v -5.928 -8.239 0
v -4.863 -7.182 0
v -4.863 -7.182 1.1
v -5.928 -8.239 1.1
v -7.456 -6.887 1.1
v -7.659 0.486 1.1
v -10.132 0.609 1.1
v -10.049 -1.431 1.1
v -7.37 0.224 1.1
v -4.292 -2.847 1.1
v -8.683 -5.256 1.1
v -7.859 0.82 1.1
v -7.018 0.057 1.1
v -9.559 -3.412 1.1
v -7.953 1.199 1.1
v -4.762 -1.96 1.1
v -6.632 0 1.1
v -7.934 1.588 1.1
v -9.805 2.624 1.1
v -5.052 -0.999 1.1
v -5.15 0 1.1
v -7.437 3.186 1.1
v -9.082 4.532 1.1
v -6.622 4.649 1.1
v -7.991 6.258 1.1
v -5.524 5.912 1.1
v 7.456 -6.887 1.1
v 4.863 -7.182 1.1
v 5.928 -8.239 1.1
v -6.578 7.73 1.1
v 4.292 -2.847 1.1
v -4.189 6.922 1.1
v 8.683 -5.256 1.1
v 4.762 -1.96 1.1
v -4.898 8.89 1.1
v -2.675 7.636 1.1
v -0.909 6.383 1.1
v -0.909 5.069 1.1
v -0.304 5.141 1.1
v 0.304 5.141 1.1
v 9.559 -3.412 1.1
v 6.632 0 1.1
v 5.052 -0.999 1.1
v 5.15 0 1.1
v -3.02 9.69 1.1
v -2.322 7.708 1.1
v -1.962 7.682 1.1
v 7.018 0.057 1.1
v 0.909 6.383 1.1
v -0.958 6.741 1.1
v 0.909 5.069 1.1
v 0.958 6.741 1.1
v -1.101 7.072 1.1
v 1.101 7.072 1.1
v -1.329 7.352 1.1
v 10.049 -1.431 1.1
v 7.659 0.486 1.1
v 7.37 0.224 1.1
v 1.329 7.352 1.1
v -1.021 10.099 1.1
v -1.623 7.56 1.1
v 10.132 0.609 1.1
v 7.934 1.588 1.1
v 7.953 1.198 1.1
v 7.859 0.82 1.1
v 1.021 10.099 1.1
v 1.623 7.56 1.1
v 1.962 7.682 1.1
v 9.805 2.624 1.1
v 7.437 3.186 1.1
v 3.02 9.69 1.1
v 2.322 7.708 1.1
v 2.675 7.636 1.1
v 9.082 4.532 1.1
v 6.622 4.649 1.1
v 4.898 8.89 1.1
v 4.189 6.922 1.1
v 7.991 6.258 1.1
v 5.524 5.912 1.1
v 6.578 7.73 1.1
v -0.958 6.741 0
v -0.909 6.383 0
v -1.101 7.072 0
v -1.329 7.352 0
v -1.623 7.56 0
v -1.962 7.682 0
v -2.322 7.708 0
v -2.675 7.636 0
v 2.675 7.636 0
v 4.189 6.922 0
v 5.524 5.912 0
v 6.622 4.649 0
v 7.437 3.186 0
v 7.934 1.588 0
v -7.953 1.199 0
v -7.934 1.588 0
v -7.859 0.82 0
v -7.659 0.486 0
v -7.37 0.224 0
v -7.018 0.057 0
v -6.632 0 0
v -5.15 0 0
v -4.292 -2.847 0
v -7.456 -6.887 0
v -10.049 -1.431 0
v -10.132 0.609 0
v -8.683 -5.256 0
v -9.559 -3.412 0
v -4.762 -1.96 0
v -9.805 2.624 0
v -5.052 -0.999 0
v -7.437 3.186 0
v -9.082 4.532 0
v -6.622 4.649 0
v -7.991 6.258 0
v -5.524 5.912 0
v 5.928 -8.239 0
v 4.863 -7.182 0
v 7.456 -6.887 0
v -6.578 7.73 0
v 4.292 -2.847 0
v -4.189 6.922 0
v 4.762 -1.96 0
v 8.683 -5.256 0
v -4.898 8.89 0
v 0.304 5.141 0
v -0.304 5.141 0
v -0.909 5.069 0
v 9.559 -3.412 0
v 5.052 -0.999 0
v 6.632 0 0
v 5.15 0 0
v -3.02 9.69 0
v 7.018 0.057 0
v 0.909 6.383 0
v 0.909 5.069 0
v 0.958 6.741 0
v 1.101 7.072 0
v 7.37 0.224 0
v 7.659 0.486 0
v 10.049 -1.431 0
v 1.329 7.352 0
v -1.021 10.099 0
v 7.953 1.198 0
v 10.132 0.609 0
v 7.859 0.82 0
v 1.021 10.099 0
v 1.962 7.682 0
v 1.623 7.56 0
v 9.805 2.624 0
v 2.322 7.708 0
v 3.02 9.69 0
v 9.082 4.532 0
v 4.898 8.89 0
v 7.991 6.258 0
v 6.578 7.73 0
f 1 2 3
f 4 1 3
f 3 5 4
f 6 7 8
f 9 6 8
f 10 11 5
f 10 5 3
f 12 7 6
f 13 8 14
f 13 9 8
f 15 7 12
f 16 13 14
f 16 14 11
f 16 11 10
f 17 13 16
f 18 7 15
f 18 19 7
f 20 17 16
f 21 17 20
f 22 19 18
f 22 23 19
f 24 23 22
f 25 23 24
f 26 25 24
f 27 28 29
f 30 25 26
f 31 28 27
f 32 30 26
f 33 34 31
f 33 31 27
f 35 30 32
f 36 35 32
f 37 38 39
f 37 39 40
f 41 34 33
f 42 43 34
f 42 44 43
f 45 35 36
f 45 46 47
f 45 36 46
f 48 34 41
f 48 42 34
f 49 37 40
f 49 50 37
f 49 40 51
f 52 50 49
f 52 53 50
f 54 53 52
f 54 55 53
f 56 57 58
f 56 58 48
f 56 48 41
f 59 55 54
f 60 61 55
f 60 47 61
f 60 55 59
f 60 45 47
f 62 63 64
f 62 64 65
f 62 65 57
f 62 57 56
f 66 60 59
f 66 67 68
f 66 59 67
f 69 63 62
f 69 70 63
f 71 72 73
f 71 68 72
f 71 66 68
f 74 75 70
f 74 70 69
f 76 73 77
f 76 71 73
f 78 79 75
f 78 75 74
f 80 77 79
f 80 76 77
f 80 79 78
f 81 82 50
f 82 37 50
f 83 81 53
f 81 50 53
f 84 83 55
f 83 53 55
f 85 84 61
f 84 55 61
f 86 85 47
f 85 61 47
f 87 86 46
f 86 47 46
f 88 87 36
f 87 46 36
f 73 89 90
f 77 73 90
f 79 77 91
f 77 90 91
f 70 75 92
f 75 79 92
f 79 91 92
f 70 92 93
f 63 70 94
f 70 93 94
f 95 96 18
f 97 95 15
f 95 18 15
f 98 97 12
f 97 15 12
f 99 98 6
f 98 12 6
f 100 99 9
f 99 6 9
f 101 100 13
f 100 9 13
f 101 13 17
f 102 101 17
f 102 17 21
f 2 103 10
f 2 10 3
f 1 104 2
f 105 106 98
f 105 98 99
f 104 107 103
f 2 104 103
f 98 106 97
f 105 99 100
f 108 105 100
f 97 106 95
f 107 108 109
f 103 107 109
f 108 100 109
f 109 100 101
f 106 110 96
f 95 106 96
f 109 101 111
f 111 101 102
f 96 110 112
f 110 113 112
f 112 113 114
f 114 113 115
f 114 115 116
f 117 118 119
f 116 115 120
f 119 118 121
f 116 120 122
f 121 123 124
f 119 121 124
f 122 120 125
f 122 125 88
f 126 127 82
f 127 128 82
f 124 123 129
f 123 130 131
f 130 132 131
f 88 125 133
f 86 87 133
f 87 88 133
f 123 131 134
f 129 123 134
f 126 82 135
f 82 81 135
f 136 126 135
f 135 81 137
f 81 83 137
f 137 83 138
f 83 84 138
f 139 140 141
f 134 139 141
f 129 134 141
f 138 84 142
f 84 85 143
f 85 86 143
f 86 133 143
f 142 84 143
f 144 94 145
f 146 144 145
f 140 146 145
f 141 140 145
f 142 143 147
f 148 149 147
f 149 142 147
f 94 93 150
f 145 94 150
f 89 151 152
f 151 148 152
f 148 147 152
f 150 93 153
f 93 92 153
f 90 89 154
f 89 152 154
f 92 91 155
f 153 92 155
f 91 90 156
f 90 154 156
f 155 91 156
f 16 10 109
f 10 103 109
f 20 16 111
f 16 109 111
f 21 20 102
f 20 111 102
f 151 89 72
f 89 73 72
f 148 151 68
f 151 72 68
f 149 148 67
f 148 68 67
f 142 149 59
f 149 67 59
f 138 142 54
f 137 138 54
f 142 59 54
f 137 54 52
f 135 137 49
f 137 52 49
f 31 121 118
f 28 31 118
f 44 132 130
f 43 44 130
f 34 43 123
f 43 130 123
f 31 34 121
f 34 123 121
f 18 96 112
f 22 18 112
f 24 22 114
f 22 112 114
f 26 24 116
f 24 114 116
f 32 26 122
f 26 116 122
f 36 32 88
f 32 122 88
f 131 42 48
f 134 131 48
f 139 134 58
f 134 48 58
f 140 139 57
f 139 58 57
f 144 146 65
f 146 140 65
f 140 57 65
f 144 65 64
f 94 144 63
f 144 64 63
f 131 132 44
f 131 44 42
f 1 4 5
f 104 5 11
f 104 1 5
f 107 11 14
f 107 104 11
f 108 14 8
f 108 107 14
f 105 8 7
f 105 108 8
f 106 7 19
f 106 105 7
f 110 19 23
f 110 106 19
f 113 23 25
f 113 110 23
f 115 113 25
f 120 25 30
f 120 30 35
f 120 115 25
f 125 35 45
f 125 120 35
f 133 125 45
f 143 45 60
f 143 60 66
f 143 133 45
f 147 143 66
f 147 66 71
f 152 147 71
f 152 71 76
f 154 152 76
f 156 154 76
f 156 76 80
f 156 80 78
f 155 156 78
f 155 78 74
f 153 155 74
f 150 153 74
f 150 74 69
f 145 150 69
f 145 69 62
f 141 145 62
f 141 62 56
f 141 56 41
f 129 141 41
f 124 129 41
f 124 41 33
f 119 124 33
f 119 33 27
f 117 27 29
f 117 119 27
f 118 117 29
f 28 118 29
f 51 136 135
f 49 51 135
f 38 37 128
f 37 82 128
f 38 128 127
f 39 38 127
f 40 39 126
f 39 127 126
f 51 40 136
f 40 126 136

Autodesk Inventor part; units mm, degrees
ref_plane "YZ Plane" through (0, 0, 0) normal (1, 0, 0) x (0, 1, 0)
ref_plane "XZ Plane" through (0, 0, 0) normal (0, 1, 0) x (-1, 0, 0)
ref_plane "XY Plane" through (0, 0, 0) normal (0, 0, 1) x (1, 0, 0)
sketch "Náčrt1" plane through (0, 0, 0) normal (0, 0, 1) x (1, 0, 0)
  point P0 (0, 0)
sketch "Náčrt2" plane through (0, 0, 0) normal (0, 0, 1) x (1, 0, 0)
  line L0 (-8.0912, 0) -> (-5.15, 0)
  arc A0 (-0.9091, 8.0399) -> (-8.0912, 0) centre (0, 0) ccw
  line L1 (-0.9091, 8.0399) -> (-0.9091, 5.0691)
  arc A1 (0.9091, 5.0691) -> (-0.9091, 5.0691) centre (0, 0) ccw
  line L2 (0.9091, 5.0691) -> (0.9091, 8.0399)
  arc A2 (8.0912, 0) -> (0.9091, 8.0399) centre (0, 0) ccw
  line L3 (5.15, 0) -> (8.0912, 0)
  arc A3 (4.2917, -2.8468) -> (5.15, 0) centre (0, 0) ccw
  line L4 (4.2917, -2.8468) -> (5.075, -8.7902)
  arc A4 (5.075, -8.7902) -> (-5.075, -8.7902) centre (0, 0) ccw
  line L5 (-4.2917, -2.8468) -> (-5.075, -8.7902)
  arc A5 (-5.15, 0) -> (-4.2917, -2.8468) centre (0, 0) ccw
  line L6 (-16.1, 0) -> (16.1, 0) projected
  line L7 (0, -14.2512) -> (0, 15.7919) projected
  dimension "d1" = 0
  dimension "d3" = 5.15
  dimension "d5" = 10.15
  dimension "d7" = 0
  dimension "d9" = 8.0912
  dimension "d11" = 0.9091
  dimension "d13" = 0.9091
  dimension "d15" = 5.075
  dimension "d17" = 5.075
  dimension "d19" = 8.5833
extrude "Vysunutí1" add sketch "Náčrt2" along normal blind 1.1 contours L6 A4 L7 A1 L1 A0 | L0 A5 L5 A4 L6 | A4 L6 A2 L2 A1 L7 | L3 L6 A4 L4 A3
fillet "Zaoblení1" radius 1.3273 4 edges at (-8.0912, 0, 0.55) (-0.9091, 8.0399, 0.55) (0.9091, 8.0399, 0.55) (8.0912, 0, 0.55)
chamfer "Zkosení1" distance 1.015 distance2 1.6222 1 edges at (-5.075, -8.7902, 0.55) measured on face at (-4.4798, 9.1079, 0.7333)
chamfer "Zkosení2" distance 1.6222 distance2 1.015 1 edges at (5.075, -8.7902, 0.55) measured on face at (4.8139, -6.809, 0.3667)
equation "\"d3\" = 0.5 * Diam"
equation "\"d5\" = 0.5 * Diam3"
equation "\"d9\" = 0.294118 * Diam3 + 0.205882 * Diam"
equation "\"d11\" = 0.0909091 * Diam3 - 0.0909091 * Diam"
equation "\"d13\" = 0.0909091 * Diam3 - 0.0909091 * Diam"
equation "\"d15\" = 0.25 * Diam3"
equation "\"d17\" = 0.25 * Diam3"
equation "\"d19\" = 0.833333 * Diam"
equation "\"d20\" = ParT"
equation "\"d22\" = 0.181818 * Diam3 - 0.181818 * sd"
equation "\"d23\" = 0.05 * Diam3"
equation "\"d24\" = 0.222222 * Diam3 - 0.222222 * sd"
equation "\"d25\" = 0.222222 * Diam3 - 0.222222 * sd"
equation "\"d26\" = 0.05 * Diam3"
equation "\"Diam3\" = 20.3"
equation "\"ParT\" = 1.1"
equation "\"Diam\" = 10.3"
equation "\"sd\" = 13"
equation "\"TEMPLATE\" = 1.2345"
properties part number "ANSI B27.7M - 3CMI-13" material "Nerezová ocel"
